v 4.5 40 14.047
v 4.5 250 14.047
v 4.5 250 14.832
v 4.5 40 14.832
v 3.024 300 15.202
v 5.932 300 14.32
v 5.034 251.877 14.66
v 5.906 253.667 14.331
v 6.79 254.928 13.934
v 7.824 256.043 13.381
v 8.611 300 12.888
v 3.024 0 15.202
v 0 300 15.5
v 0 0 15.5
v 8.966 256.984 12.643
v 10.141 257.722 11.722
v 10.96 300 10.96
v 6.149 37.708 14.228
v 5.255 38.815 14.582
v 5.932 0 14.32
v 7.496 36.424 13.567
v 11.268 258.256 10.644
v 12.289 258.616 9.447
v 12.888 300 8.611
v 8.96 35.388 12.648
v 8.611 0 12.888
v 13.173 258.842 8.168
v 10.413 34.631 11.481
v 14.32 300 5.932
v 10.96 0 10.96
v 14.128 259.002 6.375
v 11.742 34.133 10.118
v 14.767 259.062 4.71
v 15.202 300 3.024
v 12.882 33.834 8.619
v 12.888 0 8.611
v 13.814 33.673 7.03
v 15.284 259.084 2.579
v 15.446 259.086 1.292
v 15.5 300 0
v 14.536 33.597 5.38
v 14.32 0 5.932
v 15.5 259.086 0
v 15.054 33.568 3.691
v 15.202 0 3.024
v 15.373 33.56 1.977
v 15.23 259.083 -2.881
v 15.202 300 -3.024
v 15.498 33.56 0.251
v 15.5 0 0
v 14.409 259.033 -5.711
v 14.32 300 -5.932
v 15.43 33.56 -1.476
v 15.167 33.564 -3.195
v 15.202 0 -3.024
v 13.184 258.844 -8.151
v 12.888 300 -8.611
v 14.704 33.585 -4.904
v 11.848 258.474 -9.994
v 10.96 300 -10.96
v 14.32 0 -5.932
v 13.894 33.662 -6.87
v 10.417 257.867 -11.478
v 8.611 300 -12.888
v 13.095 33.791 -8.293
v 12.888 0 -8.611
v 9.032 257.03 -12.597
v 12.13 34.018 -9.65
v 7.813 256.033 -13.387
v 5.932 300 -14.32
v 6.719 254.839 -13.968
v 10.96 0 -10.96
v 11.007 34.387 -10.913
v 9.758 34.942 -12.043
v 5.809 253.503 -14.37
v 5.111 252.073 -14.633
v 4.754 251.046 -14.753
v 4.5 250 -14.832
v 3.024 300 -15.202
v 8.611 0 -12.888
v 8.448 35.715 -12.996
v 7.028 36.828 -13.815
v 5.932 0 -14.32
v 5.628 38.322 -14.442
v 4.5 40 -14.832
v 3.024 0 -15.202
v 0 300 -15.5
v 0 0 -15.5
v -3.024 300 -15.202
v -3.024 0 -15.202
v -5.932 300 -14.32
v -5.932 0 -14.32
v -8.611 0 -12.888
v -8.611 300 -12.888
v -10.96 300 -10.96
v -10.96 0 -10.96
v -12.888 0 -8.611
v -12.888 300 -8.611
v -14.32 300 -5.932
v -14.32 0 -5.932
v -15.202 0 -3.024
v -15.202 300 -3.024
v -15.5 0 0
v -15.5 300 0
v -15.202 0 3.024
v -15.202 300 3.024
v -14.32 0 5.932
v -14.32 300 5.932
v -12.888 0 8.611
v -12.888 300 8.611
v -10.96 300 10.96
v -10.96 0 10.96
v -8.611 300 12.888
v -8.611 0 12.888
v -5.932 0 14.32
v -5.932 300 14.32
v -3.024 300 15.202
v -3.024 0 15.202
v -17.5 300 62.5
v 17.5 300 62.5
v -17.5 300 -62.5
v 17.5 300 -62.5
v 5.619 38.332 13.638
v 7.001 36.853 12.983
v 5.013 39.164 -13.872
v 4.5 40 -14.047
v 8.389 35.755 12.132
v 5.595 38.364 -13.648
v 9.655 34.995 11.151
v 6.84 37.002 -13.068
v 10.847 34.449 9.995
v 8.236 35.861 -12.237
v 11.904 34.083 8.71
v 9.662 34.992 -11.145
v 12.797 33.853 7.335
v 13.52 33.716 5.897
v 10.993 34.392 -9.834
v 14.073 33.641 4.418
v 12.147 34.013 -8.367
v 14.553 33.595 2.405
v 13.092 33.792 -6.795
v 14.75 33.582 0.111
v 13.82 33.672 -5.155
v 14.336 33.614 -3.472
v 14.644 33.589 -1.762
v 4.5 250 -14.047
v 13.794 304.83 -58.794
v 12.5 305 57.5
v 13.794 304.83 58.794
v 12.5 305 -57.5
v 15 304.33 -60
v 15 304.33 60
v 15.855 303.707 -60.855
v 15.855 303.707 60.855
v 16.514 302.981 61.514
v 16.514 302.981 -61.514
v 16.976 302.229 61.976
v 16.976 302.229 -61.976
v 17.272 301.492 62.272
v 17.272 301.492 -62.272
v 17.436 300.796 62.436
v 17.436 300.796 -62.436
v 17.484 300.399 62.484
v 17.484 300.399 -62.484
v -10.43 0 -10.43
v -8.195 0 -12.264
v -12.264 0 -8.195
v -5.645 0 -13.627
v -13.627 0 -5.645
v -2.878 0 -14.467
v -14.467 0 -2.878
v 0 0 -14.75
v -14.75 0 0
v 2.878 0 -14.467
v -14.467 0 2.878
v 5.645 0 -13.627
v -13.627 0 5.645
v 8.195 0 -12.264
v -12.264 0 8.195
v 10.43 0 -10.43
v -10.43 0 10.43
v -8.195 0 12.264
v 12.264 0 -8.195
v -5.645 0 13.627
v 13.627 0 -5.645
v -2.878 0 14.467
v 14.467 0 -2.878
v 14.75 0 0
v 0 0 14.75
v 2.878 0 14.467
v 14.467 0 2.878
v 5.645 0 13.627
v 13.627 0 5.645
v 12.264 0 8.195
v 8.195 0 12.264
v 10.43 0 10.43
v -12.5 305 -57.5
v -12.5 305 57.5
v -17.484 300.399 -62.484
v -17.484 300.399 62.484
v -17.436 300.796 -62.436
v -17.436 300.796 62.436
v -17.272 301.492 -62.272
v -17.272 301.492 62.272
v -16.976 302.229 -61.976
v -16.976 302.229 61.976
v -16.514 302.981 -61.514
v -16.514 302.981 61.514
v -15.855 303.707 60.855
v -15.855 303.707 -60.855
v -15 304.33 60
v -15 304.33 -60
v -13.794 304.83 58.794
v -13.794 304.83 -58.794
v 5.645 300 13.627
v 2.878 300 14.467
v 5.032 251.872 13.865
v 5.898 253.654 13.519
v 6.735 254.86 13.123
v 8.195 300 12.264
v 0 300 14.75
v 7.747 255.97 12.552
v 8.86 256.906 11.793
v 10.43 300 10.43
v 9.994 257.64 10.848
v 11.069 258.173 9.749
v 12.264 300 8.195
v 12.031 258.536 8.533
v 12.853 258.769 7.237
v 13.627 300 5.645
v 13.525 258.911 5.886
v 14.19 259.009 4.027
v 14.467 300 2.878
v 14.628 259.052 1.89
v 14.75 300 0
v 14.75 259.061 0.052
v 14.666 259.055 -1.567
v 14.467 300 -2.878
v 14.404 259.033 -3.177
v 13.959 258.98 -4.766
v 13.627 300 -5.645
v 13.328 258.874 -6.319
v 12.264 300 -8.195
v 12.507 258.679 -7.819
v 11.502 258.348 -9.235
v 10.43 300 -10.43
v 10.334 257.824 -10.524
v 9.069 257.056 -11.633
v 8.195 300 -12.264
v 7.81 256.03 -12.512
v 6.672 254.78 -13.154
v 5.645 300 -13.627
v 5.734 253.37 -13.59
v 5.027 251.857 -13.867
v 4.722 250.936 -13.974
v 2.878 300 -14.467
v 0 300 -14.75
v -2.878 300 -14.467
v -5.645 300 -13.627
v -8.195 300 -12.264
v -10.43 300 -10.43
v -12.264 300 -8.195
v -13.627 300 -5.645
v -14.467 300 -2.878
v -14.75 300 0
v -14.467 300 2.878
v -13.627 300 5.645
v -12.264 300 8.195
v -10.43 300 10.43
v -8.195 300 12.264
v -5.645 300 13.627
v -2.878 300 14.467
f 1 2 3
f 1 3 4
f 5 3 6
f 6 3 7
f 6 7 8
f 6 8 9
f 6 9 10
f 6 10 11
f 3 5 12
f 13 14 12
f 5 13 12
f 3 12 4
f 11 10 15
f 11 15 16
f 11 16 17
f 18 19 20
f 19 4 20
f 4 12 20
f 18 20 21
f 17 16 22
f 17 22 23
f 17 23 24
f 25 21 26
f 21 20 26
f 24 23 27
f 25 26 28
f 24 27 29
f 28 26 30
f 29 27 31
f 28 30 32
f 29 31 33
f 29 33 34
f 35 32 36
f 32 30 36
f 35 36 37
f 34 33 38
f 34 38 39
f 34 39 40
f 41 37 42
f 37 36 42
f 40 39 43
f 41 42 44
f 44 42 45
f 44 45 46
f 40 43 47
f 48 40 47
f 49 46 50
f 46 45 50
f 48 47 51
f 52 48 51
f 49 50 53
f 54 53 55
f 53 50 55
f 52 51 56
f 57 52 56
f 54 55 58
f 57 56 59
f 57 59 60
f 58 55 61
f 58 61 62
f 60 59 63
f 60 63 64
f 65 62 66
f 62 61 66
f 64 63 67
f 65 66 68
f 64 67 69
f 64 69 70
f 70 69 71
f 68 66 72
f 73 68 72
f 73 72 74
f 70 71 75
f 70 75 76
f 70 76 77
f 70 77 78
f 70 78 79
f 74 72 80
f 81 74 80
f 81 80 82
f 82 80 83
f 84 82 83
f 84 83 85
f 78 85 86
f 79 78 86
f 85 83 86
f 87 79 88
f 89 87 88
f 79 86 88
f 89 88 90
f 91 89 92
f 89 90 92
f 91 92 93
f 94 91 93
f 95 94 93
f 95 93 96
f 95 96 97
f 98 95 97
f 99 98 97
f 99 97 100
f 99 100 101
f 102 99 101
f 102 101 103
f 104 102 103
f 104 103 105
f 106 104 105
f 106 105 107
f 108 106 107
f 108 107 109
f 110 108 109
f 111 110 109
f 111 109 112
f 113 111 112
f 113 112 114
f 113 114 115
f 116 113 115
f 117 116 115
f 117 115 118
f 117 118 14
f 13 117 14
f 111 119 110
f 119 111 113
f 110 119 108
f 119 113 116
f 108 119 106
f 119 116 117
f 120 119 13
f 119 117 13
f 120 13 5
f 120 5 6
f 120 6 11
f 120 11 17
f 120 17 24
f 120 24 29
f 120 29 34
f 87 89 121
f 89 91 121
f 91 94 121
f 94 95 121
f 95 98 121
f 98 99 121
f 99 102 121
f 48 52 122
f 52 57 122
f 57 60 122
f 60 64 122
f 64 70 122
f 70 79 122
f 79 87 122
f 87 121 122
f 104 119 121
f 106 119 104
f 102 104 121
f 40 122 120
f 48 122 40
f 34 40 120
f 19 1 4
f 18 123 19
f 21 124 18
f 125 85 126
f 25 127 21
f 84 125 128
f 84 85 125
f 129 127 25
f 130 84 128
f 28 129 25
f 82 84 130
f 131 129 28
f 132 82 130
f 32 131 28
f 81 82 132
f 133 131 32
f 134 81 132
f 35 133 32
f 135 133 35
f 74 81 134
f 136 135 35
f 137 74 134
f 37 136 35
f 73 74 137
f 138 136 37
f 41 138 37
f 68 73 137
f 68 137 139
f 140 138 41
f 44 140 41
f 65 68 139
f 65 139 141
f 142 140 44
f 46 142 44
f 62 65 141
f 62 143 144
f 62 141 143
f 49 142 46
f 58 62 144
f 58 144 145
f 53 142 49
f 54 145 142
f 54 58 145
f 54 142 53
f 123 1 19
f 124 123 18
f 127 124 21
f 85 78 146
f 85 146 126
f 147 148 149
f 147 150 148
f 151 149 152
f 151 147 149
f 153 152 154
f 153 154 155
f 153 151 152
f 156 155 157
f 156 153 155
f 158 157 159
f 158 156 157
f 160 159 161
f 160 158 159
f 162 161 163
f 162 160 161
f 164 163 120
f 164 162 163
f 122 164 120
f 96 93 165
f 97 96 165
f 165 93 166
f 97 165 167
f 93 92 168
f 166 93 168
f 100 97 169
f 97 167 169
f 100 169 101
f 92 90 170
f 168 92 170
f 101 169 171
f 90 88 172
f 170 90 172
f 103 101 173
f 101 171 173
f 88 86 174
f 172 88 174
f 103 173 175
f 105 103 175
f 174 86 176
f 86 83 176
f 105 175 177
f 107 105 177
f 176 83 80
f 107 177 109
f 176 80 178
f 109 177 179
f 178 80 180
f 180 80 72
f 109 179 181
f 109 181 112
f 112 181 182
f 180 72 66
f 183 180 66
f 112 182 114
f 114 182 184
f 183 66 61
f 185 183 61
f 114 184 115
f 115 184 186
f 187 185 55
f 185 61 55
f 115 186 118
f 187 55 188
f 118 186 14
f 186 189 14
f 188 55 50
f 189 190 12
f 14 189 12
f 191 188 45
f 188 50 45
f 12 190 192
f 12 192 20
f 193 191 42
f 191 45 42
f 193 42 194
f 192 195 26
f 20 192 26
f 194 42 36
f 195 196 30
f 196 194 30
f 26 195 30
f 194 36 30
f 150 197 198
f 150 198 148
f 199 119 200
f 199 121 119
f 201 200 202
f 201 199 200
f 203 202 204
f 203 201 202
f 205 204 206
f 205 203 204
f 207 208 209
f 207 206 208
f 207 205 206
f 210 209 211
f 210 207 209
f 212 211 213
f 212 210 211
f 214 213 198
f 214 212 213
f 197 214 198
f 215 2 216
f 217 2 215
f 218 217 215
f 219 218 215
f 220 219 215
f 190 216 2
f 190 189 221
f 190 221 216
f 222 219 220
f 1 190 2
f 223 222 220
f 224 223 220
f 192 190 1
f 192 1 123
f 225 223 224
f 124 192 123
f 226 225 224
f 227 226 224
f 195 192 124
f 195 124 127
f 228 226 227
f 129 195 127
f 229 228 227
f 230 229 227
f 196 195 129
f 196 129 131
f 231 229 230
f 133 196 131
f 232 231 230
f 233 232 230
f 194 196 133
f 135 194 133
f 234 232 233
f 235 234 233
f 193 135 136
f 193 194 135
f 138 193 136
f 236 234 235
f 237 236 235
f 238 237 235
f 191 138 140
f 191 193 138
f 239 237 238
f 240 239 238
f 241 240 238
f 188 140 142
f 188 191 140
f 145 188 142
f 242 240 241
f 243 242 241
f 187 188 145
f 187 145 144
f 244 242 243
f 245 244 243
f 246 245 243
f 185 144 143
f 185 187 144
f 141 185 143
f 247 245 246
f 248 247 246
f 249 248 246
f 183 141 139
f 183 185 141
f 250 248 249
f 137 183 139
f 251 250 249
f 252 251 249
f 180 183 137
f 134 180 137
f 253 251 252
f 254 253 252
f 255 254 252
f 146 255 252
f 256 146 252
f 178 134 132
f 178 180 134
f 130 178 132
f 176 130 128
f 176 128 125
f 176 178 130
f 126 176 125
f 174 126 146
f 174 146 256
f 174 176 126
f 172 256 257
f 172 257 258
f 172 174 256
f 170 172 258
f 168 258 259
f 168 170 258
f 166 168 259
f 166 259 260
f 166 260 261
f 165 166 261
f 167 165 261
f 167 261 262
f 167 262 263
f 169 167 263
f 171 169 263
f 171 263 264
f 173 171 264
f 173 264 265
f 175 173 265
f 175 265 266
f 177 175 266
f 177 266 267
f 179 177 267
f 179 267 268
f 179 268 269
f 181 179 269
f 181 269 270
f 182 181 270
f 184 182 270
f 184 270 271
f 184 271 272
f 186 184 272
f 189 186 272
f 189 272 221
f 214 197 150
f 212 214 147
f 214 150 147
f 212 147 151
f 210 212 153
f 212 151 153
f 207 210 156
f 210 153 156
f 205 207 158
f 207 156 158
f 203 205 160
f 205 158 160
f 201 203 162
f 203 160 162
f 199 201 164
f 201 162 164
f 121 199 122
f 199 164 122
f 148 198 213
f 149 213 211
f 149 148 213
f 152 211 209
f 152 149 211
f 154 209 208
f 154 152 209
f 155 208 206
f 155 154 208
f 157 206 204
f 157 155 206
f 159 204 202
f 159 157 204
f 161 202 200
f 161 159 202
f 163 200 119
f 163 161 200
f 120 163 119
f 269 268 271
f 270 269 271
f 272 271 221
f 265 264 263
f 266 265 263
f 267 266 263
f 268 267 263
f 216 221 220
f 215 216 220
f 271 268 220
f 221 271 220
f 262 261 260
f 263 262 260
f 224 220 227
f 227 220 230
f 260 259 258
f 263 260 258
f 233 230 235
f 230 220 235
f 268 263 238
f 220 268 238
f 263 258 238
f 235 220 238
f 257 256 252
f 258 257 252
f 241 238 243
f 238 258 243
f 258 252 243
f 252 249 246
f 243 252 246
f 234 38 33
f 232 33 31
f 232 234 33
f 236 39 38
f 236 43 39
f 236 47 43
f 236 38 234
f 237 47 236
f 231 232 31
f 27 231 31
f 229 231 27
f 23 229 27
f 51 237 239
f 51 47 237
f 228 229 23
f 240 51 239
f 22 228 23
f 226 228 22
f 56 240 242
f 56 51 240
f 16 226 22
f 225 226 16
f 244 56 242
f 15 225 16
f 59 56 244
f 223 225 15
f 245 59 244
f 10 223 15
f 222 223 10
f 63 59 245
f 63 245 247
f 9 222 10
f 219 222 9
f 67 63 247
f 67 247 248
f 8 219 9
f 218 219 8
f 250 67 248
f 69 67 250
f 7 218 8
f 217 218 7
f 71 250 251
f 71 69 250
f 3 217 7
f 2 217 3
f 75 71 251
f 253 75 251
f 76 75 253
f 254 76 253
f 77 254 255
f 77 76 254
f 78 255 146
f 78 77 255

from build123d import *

# Parameters (mm, degrees)
SKETCH1_R               = 15.5
SKETCH1_R_2             = 14.75
BOSS_EXTRUDE1_DEPTH     = 300
SKETCH4_W               = 35
SKETCH4_H               = 125
BOSS_EXTRUDE2_DEPTH     = 5
CUT_EXTRUDE2_DEPTH      = 50
CUT_EXTRUDE2_DEPTH_BACK = 40
FILLET2_R               = 5


with BuildPart() as part:
    # Sketch1 → Boss-Extrude1 (new body)
    with BuildSketch(Plane(origin=(0, 0, 0), x_dir=(1, 0, 0), z_dir=(0, 1, 0))):
        with Locations(Location((0, 0, 0), (0, 0, 270))):
            Circle(SKETCH1_R)
        with Locations(Location((0, 0, 0), (0, 0, 270))):
            Circle(SKETCH1_R_2, mode=Mode.SUBTRACT)
    extrude(amount=BOSS_EXTRUDE1_DEPTH)

    # Sketch4 → Boss-Extrude2 (add)
    with BuildSketch(Plane(origin=(0, 300, 0), x_dir=(1, 0, 0), z_dir=(0, 1, 0))):
        Rectangle(SKETCH4_W, SKETCH4_H)
    extrude(amount=BOSS_EXTRUDE2_DEPTH)

    # Sketch2 → Cut-Extrude2 (cut, two sides: drawn at the far end of the back side and taken through both)
    with BuildSketch(Plane.XY.offset(-CUT_EXTRUDE2_DEPTH_BACK)):
        with BuildLine():
            Line((15.5, 33.559719433), (15.5, 259.086340433))
            ThreePointArc((15.5, 259.086340433), (8.366249541, 256.521002237), (4.5, 250))
            Line((4.5, 250), (4.5, 40))
            ThreePointArc((4.5, 40), (9.126672498, 35.288216236), (15.5, 33.559719433))
        make_face()
    extrude(amount=CUT_EXTRUDE2_DEPTH + CUT_EXTRUDE2_DEPTH_BACK, mode=Mode.SUBTRACT)

    # Fillet2
    fillet2_edges = [part.edges().sort_by_distance(p)[0] for p in [
        (0, 305, -62.5),
        (0, 305, 62.5),
        (-17.5, 305, 0),
        (17.5, 305, 0),
    ]]
    fillet(fillet2_edges, radius=FILLET2_R - 0.0001)  # a hair under: the kernel refuses the full size


solid = part.part
